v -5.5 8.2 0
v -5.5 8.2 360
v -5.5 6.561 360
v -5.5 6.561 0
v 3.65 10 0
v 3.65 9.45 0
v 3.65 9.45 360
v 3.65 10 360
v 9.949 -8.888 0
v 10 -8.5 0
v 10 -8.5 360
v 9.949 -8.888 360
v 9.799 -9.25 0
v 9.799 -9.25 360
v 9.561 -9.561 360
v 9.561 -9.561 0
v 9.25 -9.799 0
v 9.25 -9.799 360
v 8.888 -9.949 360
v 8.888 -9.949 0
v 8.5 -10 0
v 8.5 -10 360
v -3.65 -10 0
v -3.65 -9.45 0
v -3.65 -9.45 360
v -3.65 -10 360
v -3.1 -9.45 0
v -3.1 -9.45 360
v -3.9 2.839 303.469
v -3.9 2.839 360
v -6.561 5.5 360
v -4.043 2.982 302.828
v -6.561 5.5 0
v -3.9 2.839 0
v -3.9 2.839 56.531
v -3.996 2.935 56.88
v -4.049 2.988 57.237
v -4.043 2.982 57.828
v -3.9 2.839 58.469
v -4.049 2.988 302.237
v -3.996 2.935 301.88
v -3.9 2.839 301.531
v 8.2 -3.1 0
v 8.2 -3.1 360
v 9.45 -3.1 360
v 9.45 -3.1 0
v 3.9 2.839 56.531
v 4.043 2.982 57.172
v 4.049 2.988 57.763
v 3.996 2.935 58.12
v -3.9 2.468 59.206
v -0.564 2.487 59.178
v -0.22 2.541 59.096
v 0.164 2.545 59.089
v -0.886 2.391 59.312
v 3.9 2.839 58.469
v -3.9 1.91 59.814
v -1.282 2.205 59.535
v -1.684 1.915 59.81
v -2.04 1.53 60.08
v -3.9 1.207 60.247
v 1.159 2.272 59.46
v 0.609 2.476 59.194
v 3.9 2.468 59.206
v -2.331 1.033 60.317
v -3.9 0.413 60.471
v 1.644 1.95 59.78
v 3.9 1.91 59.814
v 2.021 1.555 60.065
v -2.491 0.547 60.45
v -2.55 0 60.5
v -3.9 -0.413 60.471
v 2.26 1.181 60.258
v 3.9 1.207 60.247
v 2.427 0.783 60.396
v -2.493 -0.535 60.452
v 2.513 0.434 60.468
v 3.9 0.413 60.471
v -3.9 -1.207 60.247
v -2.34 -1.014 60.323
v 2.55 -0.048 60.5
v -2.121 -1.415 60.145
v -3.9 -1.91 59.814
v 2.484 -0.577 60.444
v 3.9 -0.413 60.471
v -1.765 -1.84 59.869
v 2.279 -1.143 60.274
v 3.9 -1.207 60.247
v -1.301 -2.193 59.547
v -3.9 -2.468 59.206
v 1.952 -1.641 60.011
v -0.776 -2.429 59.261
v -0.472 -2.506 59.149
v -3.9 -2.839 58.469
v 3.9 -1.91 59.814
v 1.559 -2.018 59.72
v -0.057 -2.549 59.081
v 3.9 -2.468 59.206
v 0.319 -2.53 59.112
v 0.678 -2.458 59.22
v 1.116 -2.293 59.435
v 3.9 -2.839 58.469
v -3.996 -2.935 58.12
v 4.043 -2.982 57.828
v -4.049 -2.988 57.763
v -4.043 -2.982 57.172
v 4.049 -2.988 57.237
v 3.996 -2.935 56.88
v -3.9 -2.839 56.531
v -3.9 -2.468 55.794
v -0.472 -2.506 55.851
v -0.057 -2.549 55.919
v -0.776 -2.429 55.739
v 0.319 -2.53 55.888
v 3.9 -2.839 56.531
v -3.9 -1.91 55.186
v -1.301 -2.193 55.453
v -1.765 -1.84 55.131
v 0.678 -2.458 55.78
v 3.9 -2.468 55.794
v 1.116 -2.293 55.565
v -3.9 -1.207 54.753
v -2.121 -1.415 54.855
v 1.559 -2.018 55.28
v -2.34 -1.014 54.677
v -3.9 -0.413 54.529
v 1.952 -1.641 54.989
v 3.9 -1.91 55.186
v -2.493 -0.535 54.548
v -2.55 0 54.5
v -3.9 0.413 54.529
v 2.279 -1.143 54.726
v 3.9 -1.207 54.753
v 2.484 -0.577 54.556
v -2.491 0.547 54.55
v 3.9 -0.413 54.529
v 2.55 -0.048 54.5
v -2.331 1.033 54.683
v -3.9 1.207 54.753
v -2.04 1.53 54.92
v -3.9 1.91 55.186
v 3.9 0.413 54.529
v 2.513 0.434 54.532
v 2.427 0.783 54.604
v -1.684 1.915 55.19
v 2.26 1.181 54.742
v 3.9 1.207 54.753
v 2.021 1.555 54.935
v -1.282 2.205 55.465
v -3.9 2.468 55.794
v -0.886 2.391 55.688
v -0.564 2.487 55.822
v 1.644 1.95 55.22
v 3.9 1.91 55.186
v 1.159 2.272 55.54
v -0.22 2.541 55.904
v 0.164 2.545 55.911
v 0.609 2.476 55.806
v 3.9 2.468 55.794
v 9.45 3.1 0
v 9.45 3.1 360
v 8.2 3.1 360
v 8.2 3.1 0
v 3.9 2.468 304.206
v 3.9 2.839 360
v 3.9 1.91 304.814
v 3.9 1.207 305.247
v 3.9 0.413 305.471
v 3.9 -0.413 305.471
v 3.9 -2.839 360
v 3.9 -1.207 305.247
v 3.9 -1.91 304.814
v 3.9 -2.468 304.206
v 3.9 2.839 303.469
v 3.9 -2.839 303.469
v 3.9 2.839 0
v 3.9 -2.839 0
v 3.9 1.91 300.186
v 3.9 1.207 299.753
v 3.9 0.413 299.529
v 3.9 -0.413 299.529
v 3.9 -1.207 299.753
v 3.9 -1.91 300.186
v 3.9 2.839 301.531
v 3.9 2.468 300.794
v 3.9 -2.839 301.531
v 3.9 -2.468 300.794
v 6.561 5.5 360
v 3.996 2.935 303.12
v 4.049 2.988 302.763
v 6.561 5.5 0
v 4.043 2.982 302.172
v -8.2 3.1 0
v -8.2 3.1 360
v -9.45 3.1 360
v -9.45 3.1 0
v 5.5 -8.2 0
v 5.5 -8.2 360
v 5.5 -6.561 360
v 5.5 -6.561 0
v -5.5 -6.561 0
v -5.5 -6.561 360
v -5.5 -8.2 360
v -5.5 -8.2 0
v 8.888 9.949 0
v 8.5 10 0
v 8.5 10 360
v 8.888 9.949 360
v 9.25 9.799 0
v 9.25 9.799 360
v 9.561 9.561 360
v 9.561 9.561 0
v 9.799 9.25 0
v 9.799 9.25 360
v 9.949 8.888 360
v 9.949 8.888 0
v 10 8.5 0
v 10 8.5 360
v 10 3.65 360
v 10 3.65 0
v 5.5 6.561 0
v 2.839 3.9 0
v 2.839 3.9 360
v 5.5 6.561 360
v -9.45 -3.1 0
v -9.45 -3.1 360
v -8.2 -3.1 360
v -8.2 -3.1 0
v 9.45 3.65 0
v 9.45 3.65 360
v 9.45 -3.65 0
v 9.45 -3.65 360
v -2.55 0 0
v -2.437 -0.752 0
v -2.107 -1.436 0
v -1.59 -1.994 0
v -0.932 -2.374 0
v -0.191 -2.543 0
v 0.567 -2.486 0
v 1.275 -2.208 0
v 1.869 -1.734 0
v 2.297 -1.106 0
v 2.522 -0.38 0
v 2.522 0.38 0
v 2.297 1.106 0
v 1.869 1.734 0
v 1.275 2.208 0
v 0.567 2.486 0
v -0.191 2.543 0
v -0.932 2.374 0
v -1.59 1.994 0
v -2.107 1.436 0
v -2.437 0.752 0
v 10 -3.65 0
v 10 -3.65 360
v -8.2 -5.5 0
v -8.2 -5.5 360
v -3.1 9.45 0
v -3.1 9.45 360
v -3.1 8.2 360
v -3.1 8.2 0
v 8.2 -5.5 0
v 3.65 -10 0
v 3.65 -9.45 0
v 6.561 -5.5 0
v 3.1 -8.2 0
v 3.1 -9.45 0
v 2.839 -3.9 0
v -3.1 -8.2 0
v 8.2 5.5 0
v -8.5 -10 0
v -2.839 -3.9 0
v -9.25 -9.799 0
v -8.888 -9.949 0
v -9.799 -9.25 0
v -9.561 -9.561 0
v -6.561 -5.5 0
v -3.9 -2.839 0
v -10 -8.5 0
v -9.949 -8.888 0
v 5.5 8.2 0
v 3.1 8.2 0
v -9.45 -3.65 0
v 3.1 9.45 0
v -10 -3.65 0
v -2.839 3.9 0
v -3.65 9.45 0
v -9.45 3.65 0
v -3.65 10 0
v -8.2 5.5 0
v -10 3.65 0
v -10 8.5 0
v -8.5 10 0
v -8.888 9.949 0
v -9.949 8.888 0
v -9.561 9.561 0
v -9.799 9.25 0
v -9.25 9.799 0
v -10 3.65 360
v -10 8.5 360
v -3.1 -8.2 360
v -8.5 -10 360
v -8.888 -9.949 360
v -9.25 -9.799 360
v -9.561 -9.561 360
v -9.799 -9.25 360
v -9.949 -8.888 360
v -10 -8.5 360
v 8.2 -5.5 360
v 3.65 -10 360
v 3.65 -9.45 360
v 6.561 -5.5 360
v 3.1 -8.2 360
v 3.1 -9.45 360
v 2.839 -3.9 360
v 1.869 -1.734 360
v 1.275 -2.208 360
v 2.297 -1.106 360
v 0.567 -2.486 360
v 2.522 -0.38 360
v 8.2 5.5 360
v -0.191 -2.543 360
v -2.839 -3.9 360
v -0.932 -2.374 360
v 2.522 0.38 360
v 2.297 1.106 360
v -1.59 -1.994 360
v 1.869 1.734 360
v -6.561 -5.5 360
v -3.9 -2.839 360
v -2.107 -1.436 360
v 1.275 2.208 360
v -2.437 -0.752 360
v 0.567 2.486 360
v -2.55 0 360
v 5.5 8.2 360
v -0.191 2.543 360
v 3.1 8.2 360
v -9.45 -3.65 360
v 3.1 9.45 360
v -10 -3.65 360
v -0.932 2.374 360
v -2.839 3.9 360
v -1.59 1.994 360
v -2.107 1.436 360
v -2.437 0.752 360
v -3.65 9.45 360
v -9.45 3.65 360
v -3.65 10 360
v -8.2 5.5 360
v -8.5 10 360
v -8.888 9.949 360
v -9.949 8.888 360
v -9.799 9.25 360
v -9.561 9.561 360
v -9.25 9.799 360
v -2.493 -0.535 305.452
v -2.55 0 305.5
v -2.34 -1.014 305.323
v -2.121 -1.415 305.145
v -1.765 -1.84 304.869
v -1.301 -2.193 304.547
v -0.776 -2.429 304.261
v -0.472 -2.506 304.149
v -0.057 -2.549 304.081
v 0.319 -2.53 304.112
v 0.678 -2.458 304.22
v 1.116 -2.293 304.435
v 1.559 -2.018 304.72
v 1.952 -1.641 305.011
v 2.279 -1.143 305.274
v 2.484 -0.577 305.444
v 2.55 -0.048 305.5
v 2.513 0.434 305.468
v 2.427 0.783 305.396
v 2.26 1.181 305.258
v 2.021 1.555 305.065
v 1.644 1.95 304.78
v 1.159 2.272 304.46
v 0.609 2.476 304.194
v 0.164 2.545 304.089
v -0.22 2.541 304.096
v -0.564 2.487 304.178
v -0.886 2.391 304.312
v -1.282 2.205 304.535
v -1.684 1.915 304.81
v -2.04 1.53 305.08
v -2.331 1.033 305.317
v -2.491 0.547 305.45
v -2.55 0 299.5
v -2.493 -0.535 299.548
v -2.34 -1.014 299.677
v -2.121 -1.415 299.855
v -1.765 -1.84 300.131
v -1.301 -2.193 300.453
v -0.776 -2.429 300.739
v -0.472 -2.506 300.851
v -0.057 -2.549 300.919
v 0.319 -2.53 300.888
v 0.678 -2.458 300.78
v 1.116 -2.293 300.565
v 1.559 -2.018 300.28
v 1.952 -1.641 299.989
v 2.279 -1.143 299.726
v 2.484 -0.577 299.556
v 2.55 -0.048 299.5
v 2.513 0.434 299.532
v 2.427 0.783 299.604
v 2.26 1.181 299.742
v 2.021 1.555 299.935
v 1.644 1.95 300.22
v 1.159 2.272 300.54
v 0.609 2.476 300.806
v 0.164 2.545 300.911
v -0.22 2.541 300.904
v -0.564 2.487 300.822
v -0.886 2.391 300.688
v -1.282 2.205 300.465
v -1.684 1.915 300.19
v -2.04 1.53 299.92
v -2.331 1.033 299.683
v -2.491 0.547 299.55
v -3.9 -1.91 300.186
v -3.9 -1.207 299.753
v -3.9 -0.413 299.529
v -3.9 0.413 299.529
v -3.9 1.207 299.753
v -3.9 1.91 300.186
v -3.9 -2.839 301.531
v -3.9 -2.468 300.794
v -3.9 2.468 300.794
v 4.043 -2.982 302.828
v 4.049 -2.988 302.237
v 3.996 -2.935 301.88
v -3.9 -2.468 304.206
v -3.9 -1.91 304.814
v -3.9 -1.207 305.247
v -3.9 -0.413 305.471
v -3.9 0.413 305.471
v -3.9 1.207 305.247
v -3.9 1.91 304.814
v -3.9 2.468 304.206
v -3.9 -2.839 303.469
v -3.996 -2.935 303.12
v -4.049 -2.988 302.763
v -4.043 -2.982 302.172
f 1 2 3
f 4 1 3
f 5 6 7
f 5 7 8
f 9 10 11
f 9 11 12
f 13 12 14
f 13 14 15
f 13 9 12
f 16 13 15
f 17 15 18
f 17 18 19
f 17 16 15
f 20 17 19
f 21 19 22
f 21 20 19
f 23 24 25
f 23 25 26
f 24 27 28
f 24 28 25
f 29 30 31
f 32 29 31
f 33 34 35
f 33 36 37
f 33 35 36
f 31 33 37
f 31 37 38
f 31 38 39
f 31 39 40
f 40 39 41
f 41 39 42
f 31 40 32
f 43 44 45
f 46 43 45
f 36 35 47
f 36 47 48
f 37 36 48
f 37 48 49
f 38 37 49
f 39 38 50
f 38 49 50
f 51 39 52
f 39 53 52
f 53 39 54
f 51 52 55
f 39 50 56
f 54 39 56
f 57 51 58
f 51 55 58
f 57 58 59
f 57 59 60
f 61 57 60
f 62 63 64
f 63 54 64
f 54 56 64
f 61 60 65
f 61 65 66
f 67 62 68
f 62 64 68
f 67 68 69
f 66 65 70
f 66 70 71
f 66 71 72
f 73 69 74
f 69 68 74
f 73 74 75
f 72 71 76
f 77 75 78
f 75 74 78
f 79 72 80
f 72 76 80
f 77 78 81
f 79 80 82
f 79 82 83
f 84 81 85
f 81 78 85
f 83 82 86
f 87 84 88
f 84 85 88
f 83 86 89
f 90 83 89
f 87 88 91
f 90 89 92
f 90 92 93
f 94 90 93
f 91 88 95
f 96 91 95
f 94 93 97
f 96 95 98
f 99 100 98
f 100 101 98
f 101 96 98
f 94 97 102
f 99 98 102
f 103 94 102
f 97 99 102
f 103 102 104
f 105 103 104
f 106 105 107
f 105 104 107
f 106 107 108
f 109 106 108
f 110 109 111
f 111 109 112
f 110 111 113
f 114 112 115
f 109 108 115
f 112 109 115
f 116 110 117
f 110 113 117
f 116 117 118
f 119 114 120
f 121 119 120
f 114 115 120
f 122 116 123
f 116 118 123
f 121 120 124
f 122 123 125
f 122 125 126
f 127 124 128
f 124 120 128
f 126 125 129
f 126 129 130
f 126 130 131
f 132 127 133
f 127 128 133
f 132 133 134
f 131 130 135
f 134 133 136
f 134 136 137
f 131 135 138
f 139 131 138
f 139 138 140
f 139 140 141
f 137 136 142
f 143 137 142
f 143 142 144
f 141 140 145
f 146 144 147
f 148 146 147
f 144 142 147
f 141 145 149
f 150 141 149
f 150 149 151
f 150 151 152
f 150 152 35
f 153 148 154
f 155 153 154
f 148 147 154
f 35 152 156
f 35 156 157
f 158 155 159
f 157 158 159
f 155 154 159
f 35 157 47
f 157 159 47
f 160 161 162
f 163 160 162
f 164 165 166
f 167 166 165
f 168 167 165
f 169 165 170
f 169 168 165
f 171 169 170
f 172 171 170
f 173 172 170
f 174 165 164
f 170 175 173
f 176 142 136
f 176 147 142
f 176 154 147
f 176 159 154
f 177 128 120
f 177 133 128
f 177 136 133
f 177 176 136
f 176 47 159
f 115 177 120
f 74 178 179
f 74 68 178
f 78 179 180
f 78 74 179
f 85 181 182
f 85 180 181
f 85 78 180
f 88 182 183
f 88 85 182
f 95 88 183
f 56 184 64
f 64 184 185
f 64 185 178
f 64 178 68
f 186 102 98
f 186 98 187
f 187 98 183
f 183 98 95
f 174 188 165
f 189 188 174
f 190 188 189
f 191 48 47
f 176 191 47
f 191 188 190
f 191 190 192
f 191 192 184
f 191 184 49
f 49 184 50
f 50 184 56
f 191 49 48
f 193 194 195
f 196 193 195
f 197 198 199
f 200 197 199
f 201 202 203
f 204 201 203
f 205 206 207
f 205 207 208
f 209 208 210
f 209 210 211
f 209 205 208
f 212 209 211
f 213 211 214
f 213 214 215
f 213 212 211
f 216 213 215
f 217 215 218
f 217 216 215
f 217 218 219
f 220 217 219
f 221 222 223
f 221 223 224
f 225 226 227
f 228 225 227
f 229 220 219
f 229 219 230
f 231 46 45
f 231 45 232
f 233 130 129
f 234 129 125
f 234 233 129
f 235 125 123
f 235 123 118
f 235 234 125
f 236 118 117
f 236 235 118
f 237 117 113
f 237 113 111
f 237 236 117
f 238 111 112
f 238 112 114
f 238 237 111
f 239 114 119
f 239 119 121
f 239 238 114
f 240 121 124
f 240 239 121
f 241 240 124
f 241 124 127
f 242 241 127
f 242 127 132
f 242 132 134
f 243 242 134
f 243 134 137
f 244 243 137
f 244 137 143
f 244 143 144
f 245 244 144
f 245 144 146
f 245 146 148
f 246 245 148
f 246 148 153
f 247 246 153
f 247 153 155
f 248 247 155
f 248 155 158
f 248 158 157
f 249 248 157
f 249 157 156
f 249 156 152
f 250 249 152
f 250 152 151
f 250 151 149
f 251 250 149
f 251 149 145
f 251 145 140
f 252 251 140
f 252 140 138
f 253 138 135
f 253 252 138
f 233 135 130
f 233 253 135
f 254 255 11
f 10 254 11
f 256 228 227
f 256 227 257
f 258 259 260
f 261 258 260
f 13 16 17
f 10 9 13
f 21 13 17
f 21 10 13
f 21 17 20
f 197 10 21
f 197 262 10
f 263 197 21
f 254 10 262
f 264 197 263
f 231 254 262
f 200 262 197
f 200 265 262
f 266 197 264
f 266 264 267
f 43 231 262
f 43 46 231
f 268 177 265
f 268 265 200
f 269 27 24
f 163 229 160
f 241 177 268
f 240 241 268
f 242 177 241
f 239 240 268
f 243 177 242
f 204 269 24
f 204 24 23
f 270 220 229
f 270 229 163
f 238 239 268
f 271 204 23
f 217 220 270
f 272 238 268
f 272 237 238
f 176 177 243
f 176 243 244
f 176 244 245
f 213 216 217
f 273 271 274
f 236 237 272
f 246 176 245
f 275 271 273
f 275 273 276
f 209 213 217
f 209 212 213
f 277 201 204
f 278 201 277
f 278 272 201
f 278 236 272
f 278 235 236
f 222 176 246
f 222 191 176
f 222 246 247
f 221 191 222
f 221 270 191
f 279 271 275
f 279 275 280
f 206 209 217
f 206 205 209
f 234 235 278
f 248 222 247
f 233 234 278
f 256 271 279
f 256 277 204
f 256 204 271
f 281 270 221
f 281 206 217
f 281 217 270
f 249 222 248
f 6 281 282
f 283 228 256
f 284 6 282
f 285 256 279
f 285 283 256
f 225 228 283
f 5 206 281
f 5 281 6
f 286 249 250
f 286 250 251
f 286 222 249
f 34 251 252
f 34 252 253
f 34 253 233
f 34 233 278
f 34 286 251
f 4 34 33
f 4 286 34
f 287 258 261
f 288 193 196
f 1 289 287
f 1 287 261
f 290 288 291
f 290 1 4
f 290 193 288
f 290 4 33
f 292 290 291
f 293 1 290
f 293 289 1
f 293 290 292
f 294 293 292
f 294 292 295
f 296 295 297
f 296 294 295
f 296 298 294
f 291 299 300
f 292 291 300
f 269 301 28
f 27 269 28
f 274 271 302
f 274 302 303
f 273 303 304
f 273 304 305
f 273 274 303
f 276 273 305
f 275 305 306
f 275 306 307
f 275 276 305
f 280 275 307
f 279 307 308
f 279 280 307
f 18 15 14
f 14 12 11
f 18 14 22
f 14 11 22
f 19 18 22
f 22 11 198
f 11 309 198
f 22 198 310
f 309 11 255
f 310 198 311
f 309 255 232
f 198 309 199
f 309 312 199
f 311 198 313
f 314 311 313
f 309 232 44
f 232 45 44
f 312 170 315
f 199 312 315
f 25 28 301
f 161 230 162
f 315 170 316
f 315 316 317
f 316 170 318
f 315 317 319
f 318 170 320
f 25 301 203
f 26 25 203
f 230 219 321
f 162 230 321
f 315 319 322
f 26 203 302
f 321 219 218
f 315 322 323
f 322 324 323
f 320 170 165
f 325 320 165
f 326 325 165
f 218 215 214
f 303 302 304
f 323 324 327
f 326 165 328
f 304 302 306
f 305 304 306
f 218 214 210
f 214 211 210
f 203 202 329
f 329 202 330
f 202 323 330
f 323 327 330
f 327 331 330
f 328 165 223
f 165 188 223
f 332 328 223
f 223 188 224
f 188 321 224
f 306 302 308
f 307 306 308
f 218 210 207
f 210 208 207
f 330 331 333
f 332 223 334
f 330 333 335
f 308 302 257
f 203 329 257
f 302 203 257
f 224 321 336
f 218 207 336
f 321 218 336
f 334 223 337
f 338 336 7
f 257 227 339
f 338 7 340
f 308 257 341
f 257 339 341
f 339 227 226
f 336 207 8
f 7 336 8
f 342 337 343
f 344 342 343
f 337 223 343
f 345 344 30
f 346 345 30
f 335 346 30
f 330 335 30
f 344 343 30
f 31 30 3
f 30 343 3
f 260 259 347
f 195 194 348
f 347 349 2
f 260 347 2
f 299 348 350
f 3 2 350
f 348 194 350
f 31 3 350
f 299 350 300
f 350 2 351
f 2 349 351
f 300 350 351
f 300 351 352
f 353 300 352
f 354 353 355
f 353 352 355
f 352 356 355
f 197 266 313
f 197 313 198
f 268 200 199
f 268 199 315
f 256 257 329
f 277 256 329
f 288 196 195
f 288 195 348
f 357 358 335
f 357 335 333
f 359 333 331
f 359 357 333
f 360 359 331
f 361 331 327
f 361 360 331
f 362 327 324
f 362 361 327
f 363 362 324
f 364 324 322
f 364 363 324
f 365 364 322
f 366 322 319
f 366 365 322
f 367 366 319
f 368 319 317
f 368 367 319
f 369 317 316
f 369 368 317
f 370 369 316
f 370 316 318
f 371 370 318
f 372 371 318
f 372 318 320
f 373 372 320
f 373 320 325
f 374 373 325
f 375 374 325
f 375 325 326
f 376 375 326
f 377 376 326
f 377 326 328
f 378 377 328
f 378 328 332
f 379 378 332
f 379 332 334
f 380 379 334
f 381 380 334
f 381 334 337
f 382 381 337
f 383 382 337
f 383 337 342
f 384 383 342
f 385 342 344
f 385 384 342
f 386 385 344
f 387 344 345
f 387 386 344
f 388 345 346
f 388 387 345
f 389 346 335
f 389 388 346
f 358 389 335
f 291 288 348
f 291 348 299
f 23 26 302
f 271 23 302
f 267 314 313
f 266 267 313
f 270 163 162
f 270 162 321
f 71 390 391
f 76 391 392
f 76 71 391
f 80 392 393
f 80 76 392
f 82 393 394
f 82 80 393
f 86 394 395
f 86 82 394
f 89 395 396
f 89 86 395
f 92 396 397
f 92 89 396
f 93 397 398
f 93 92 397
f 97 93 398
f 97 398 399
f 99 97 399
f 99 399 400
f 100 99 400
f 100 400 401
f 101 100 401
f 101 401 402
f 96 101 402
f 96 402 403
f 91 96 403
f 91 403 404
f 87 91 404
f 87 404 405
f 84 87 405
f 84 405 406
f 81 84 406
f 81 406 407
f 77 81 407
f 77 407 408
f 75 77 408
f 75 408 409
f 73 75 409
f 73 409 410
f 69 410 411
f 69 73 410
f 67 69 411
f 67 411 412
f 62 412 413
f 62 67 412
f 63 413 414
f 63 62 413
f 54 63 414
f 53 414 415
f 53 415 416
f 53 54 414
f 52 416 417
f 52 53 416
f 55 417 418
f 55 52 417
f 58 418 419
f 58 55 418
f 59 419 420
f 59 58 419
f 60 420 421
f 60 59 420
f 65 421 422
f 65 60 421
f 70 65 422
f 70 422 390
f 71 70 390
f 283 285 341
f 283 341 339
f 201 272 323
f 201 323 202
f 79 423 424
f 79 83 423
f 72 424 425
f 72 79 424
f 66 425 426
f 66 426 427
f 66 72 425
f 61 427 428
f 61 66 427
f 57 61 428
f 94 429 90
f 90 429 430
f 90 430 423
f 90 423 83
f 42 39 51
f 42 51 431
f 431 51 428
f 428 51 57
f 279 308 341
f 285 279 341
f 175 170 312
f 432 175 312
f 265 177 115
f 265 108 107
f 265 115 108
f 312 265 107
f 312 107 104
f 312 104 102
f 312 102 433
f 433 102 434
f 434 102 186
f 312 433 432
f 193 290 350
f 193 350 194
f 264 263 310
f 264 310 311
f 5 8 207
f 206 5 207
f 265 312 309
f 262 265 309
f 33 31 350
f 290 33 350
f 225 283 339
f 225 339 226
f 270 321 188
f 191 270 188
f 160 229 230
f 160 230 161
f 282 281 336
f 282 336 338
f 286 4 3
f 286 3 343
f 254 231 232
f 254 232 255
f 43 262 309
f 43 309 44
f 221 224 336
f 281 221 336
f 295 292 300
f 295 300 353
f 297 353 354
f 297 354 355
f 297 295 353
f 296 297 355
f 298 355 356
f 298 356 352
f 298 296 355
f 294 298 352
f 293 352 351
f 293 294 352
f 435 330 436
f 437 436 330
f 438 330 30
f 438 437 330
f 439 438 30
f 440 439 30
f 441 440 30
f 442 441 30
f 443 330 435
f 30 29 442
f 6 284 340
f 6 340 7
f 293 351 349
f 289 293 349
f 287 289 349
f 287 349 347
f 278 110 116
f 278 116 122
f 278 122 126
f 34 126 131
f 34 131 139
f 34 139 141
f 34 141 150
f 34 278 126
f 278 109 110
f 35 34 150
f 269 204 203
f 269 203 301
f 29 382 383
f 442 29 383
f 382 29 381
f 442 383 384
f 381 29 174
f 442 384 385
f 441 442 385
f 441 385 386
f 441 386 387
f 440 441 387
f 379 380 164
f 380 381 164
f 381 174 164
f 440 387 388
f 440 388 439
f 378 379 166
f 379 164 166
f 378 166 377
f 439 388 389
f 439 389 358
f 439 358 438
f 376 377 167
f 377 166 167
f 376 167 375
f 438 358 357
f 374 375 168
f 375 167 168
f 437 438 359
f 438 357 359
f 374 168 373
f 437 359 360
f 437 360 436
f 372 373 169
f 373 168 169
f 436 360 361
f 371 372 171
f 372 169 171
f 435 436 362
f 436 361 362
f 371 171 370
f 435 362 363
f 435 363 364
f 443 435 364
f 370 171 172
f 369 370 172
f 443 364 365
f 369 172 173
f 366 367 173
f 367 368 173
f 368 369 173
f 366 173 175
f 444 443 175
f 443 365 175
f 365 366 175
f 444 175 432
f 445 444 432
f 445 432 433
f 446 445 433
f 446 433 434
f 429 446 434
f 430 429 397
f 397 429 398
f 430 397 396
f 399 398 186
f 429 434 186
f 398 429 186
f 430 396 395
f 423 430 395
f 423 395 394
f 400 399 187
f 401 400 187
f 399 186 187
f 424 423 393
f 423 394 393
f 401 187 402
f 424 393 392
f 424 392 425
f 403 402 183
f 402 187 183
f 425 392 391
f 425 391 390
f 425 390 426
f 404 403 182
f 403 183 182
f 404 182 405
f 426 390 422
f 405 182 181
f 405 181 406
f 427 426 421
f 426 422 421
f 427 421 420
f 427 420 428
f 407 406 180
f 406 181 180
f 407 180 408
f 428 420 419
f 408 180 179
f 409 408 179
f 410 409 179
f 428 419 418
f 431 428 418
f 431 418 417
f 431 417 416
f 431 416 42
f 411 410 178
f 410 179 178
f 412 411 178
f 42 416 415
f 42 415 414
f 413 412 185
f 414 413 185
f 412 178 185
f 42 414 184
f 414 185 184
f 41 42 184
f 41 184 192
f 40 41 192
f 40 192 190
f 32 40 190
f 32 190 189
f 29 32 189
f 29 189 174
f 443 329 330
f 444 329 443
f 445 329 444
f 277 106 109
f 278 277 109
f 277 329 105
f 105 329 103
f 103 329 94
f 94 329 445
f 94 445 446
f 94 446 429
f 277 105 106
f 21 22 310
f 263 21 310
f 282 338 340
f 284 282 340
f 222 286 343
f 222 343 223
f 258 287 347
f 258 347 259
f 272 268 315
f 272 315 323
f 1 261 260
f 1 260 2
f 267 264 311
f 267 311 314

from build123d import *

# Parameters (mm, degrees)
SKETCH_2_R          = 2.55
EXTRUDE_1_DEPTH     = 360
SKETCH_3_R          = 3
CUT_EXTRUDE_1_DEPTH = 361.693775937


with BuildPart() as part:
    # 草图2 → 凸台-拉伸1 (new body)
    with BuildSketch(Plane.XY):
        with BuildLine():
            Line((-3.9, 2.839339828), (-6.560660172, 5.5))
            Line((-6.560660172, 5.5), (-8.2, 5.5))
            Line((-8.2, 5.5), (-8.2, 3.1))
            Line((-8.2, 3.1), (-9.45, 3.1))
            Line((-9.45, 3.1), (-9.45, 3.65))
            Line((-9.45, 3.65), (-10, 3.65))
            Line((-10, 3.65), (-10, 8.5))
            ThreePointArc((-10, 8.5), (-9.560660172, 9.560660172), (-8.5, 10))
            Line((-8.5, 10), (-3.65, 10))
            Line((-3.65, 10), (-3.65, 9.45))
            Line((-3.65, 9.45), (-3.1, 9.45))
            Line((-3.1, 9.45), (-3.1, 8.2))
            Line((-3.1, 8.2), (-5.5, 8.2))
            Line((-5.5, 8.2), (-5.5, 6.560660172))
            Line((-5.5, 6.560660172), (-2.839339828, 3.9))
            Line((-2.839339828, 3.9), (2.839339828, 3.9))
            Line((2.839339828, 3.9), (5.5, 6.560660172))
            Line((5.5, 6.560660172), (5.5, 8.2))
            Line((5.5, 8.2), (3.1, 8.2))
            Line((3.1, 8.2), (3.1, 9.45))
            Line((3.1, 9.45), (3.65, 9.45))
            Line((3.65, 9.45), (3.65, 10))
            Line((3.65, 10), (8.5, 10))
            ThreePointArc((8.5, 10), (9.560660172, 9.560660172), (10, 8.5))
            Line((10, 8.5), (10, 3.65))
            Line((10, 3.65), (9.45, 3.65))
            Line((9.45, 3.65), (9.45, 3.1))
            Line((9.45, 3.1), (8.2, 3.1))
            Line((8.2, 3.1), (8.2, 5.5))
            Line((8.2, 5.5), (6.560660172, 5.5))
            Line((6.560660172, 5.5), (3.9, 2.839339828))
            Line((3.9, 2.839339828), (3.9, -2.839339828))
            Line((3.9, -2.839339828), (6.560660172, -5.5))
            Line((6.560660172, -5.5), (8.2, -5.5))
            Line((8.2, -5.5), (8.2, -3.1))
            Line((8.2, -3.1), (9.45, -3.1))
            Line((9.45, -3.1), (9.45, -3.65))
            Line((9.45, -3.65), (10, -3.65))
            Line((10, -3.65), (10, -8.5))
            ThreePointArc((10, -8.5), (9.560660172, -9.560660172), (8.5, -10))
            Line((8.5, -10), (3.65, -10))
            Line((3.65, -10), (3.65, -9.45))
            Line((3.65, -9.45), (3.1, -9.45))
            Line((3.1, -9.45), (3.1, -8.2))
            Line((3.1, -8.2), (5.5, -8.2))
            Line((5.5, -8.2), (5.5, -6.560660172))
            Line((5.5, -6.560660172), (2.839339828, -3.9))
            Line((2.839339828, -3.9), (-2.839339828, -3.9))
            Line((-2.839339828, -3.9), (-5.5, -6.560660172))
            Line((-5.5, -6.560660172), (-5.5, -8.2))
            Line((-5.5, -8.2), (-3.1, -8.2))
            Line((-3.1, -8.2), (-3.1, -9.45))
            Line((-3.1, -9.45), (-3.65, -9.45))
            Line((-3.65, -9.45), (-3.65, -10))
            Line((-3.65, -10), (-8.5, -10))
            ThreePointArc((-8.5, -10), (-9.560660172, -9.560660172), (-10, -8.5))
            Line((-10, -8.5), (-10, -3.65))
            Line((-10, -3.65), (-9.45, -3.65))
            Line((-9.45, -3.65), (-9.45, -3.1))
            Line((-9.45, -3.1), (-8.2, -3.1))
            Line((-8.2, -3.1), (-8.2, -5.5))
            Line((-8.2, -5.5), (-6.560660172, -5.5))
            Line((-6.560660172, -5.5), (-3.9, -2.839339828))
            Line((-3.9, -2.839339828), (-3.9, 2.839339828))
        make_face()
        with Locations(Location((0, 0, 0), (0, 0, 180))):
            Circle(SKETCH_2_R, mode=Mode.SUBTRACT)
    extrude(amount=EXTRUDE_1_DEPTH)

    # 草图3 → 切除-拉伸1 (cut, through all)
    with BuildSketch(Plane(origin=(10, 0, 0), x_dir=(0, 0, -1), z_dir=(1, 0, 0))):
        with Locations(Location((-57.5, 0, 0), (0, 0, 71.16400384))):
            Circle(SKETCH_3_R)
        with Locations(Location((-302.5, 0, 0), (0, 0, 108.835996159))):
            Circle(SKETCH_3_R)
    extrude(amount=-CUT_EXTRUDE_1_DEPTH, mode=Mode.SUBTRACT)


solid = part.part
